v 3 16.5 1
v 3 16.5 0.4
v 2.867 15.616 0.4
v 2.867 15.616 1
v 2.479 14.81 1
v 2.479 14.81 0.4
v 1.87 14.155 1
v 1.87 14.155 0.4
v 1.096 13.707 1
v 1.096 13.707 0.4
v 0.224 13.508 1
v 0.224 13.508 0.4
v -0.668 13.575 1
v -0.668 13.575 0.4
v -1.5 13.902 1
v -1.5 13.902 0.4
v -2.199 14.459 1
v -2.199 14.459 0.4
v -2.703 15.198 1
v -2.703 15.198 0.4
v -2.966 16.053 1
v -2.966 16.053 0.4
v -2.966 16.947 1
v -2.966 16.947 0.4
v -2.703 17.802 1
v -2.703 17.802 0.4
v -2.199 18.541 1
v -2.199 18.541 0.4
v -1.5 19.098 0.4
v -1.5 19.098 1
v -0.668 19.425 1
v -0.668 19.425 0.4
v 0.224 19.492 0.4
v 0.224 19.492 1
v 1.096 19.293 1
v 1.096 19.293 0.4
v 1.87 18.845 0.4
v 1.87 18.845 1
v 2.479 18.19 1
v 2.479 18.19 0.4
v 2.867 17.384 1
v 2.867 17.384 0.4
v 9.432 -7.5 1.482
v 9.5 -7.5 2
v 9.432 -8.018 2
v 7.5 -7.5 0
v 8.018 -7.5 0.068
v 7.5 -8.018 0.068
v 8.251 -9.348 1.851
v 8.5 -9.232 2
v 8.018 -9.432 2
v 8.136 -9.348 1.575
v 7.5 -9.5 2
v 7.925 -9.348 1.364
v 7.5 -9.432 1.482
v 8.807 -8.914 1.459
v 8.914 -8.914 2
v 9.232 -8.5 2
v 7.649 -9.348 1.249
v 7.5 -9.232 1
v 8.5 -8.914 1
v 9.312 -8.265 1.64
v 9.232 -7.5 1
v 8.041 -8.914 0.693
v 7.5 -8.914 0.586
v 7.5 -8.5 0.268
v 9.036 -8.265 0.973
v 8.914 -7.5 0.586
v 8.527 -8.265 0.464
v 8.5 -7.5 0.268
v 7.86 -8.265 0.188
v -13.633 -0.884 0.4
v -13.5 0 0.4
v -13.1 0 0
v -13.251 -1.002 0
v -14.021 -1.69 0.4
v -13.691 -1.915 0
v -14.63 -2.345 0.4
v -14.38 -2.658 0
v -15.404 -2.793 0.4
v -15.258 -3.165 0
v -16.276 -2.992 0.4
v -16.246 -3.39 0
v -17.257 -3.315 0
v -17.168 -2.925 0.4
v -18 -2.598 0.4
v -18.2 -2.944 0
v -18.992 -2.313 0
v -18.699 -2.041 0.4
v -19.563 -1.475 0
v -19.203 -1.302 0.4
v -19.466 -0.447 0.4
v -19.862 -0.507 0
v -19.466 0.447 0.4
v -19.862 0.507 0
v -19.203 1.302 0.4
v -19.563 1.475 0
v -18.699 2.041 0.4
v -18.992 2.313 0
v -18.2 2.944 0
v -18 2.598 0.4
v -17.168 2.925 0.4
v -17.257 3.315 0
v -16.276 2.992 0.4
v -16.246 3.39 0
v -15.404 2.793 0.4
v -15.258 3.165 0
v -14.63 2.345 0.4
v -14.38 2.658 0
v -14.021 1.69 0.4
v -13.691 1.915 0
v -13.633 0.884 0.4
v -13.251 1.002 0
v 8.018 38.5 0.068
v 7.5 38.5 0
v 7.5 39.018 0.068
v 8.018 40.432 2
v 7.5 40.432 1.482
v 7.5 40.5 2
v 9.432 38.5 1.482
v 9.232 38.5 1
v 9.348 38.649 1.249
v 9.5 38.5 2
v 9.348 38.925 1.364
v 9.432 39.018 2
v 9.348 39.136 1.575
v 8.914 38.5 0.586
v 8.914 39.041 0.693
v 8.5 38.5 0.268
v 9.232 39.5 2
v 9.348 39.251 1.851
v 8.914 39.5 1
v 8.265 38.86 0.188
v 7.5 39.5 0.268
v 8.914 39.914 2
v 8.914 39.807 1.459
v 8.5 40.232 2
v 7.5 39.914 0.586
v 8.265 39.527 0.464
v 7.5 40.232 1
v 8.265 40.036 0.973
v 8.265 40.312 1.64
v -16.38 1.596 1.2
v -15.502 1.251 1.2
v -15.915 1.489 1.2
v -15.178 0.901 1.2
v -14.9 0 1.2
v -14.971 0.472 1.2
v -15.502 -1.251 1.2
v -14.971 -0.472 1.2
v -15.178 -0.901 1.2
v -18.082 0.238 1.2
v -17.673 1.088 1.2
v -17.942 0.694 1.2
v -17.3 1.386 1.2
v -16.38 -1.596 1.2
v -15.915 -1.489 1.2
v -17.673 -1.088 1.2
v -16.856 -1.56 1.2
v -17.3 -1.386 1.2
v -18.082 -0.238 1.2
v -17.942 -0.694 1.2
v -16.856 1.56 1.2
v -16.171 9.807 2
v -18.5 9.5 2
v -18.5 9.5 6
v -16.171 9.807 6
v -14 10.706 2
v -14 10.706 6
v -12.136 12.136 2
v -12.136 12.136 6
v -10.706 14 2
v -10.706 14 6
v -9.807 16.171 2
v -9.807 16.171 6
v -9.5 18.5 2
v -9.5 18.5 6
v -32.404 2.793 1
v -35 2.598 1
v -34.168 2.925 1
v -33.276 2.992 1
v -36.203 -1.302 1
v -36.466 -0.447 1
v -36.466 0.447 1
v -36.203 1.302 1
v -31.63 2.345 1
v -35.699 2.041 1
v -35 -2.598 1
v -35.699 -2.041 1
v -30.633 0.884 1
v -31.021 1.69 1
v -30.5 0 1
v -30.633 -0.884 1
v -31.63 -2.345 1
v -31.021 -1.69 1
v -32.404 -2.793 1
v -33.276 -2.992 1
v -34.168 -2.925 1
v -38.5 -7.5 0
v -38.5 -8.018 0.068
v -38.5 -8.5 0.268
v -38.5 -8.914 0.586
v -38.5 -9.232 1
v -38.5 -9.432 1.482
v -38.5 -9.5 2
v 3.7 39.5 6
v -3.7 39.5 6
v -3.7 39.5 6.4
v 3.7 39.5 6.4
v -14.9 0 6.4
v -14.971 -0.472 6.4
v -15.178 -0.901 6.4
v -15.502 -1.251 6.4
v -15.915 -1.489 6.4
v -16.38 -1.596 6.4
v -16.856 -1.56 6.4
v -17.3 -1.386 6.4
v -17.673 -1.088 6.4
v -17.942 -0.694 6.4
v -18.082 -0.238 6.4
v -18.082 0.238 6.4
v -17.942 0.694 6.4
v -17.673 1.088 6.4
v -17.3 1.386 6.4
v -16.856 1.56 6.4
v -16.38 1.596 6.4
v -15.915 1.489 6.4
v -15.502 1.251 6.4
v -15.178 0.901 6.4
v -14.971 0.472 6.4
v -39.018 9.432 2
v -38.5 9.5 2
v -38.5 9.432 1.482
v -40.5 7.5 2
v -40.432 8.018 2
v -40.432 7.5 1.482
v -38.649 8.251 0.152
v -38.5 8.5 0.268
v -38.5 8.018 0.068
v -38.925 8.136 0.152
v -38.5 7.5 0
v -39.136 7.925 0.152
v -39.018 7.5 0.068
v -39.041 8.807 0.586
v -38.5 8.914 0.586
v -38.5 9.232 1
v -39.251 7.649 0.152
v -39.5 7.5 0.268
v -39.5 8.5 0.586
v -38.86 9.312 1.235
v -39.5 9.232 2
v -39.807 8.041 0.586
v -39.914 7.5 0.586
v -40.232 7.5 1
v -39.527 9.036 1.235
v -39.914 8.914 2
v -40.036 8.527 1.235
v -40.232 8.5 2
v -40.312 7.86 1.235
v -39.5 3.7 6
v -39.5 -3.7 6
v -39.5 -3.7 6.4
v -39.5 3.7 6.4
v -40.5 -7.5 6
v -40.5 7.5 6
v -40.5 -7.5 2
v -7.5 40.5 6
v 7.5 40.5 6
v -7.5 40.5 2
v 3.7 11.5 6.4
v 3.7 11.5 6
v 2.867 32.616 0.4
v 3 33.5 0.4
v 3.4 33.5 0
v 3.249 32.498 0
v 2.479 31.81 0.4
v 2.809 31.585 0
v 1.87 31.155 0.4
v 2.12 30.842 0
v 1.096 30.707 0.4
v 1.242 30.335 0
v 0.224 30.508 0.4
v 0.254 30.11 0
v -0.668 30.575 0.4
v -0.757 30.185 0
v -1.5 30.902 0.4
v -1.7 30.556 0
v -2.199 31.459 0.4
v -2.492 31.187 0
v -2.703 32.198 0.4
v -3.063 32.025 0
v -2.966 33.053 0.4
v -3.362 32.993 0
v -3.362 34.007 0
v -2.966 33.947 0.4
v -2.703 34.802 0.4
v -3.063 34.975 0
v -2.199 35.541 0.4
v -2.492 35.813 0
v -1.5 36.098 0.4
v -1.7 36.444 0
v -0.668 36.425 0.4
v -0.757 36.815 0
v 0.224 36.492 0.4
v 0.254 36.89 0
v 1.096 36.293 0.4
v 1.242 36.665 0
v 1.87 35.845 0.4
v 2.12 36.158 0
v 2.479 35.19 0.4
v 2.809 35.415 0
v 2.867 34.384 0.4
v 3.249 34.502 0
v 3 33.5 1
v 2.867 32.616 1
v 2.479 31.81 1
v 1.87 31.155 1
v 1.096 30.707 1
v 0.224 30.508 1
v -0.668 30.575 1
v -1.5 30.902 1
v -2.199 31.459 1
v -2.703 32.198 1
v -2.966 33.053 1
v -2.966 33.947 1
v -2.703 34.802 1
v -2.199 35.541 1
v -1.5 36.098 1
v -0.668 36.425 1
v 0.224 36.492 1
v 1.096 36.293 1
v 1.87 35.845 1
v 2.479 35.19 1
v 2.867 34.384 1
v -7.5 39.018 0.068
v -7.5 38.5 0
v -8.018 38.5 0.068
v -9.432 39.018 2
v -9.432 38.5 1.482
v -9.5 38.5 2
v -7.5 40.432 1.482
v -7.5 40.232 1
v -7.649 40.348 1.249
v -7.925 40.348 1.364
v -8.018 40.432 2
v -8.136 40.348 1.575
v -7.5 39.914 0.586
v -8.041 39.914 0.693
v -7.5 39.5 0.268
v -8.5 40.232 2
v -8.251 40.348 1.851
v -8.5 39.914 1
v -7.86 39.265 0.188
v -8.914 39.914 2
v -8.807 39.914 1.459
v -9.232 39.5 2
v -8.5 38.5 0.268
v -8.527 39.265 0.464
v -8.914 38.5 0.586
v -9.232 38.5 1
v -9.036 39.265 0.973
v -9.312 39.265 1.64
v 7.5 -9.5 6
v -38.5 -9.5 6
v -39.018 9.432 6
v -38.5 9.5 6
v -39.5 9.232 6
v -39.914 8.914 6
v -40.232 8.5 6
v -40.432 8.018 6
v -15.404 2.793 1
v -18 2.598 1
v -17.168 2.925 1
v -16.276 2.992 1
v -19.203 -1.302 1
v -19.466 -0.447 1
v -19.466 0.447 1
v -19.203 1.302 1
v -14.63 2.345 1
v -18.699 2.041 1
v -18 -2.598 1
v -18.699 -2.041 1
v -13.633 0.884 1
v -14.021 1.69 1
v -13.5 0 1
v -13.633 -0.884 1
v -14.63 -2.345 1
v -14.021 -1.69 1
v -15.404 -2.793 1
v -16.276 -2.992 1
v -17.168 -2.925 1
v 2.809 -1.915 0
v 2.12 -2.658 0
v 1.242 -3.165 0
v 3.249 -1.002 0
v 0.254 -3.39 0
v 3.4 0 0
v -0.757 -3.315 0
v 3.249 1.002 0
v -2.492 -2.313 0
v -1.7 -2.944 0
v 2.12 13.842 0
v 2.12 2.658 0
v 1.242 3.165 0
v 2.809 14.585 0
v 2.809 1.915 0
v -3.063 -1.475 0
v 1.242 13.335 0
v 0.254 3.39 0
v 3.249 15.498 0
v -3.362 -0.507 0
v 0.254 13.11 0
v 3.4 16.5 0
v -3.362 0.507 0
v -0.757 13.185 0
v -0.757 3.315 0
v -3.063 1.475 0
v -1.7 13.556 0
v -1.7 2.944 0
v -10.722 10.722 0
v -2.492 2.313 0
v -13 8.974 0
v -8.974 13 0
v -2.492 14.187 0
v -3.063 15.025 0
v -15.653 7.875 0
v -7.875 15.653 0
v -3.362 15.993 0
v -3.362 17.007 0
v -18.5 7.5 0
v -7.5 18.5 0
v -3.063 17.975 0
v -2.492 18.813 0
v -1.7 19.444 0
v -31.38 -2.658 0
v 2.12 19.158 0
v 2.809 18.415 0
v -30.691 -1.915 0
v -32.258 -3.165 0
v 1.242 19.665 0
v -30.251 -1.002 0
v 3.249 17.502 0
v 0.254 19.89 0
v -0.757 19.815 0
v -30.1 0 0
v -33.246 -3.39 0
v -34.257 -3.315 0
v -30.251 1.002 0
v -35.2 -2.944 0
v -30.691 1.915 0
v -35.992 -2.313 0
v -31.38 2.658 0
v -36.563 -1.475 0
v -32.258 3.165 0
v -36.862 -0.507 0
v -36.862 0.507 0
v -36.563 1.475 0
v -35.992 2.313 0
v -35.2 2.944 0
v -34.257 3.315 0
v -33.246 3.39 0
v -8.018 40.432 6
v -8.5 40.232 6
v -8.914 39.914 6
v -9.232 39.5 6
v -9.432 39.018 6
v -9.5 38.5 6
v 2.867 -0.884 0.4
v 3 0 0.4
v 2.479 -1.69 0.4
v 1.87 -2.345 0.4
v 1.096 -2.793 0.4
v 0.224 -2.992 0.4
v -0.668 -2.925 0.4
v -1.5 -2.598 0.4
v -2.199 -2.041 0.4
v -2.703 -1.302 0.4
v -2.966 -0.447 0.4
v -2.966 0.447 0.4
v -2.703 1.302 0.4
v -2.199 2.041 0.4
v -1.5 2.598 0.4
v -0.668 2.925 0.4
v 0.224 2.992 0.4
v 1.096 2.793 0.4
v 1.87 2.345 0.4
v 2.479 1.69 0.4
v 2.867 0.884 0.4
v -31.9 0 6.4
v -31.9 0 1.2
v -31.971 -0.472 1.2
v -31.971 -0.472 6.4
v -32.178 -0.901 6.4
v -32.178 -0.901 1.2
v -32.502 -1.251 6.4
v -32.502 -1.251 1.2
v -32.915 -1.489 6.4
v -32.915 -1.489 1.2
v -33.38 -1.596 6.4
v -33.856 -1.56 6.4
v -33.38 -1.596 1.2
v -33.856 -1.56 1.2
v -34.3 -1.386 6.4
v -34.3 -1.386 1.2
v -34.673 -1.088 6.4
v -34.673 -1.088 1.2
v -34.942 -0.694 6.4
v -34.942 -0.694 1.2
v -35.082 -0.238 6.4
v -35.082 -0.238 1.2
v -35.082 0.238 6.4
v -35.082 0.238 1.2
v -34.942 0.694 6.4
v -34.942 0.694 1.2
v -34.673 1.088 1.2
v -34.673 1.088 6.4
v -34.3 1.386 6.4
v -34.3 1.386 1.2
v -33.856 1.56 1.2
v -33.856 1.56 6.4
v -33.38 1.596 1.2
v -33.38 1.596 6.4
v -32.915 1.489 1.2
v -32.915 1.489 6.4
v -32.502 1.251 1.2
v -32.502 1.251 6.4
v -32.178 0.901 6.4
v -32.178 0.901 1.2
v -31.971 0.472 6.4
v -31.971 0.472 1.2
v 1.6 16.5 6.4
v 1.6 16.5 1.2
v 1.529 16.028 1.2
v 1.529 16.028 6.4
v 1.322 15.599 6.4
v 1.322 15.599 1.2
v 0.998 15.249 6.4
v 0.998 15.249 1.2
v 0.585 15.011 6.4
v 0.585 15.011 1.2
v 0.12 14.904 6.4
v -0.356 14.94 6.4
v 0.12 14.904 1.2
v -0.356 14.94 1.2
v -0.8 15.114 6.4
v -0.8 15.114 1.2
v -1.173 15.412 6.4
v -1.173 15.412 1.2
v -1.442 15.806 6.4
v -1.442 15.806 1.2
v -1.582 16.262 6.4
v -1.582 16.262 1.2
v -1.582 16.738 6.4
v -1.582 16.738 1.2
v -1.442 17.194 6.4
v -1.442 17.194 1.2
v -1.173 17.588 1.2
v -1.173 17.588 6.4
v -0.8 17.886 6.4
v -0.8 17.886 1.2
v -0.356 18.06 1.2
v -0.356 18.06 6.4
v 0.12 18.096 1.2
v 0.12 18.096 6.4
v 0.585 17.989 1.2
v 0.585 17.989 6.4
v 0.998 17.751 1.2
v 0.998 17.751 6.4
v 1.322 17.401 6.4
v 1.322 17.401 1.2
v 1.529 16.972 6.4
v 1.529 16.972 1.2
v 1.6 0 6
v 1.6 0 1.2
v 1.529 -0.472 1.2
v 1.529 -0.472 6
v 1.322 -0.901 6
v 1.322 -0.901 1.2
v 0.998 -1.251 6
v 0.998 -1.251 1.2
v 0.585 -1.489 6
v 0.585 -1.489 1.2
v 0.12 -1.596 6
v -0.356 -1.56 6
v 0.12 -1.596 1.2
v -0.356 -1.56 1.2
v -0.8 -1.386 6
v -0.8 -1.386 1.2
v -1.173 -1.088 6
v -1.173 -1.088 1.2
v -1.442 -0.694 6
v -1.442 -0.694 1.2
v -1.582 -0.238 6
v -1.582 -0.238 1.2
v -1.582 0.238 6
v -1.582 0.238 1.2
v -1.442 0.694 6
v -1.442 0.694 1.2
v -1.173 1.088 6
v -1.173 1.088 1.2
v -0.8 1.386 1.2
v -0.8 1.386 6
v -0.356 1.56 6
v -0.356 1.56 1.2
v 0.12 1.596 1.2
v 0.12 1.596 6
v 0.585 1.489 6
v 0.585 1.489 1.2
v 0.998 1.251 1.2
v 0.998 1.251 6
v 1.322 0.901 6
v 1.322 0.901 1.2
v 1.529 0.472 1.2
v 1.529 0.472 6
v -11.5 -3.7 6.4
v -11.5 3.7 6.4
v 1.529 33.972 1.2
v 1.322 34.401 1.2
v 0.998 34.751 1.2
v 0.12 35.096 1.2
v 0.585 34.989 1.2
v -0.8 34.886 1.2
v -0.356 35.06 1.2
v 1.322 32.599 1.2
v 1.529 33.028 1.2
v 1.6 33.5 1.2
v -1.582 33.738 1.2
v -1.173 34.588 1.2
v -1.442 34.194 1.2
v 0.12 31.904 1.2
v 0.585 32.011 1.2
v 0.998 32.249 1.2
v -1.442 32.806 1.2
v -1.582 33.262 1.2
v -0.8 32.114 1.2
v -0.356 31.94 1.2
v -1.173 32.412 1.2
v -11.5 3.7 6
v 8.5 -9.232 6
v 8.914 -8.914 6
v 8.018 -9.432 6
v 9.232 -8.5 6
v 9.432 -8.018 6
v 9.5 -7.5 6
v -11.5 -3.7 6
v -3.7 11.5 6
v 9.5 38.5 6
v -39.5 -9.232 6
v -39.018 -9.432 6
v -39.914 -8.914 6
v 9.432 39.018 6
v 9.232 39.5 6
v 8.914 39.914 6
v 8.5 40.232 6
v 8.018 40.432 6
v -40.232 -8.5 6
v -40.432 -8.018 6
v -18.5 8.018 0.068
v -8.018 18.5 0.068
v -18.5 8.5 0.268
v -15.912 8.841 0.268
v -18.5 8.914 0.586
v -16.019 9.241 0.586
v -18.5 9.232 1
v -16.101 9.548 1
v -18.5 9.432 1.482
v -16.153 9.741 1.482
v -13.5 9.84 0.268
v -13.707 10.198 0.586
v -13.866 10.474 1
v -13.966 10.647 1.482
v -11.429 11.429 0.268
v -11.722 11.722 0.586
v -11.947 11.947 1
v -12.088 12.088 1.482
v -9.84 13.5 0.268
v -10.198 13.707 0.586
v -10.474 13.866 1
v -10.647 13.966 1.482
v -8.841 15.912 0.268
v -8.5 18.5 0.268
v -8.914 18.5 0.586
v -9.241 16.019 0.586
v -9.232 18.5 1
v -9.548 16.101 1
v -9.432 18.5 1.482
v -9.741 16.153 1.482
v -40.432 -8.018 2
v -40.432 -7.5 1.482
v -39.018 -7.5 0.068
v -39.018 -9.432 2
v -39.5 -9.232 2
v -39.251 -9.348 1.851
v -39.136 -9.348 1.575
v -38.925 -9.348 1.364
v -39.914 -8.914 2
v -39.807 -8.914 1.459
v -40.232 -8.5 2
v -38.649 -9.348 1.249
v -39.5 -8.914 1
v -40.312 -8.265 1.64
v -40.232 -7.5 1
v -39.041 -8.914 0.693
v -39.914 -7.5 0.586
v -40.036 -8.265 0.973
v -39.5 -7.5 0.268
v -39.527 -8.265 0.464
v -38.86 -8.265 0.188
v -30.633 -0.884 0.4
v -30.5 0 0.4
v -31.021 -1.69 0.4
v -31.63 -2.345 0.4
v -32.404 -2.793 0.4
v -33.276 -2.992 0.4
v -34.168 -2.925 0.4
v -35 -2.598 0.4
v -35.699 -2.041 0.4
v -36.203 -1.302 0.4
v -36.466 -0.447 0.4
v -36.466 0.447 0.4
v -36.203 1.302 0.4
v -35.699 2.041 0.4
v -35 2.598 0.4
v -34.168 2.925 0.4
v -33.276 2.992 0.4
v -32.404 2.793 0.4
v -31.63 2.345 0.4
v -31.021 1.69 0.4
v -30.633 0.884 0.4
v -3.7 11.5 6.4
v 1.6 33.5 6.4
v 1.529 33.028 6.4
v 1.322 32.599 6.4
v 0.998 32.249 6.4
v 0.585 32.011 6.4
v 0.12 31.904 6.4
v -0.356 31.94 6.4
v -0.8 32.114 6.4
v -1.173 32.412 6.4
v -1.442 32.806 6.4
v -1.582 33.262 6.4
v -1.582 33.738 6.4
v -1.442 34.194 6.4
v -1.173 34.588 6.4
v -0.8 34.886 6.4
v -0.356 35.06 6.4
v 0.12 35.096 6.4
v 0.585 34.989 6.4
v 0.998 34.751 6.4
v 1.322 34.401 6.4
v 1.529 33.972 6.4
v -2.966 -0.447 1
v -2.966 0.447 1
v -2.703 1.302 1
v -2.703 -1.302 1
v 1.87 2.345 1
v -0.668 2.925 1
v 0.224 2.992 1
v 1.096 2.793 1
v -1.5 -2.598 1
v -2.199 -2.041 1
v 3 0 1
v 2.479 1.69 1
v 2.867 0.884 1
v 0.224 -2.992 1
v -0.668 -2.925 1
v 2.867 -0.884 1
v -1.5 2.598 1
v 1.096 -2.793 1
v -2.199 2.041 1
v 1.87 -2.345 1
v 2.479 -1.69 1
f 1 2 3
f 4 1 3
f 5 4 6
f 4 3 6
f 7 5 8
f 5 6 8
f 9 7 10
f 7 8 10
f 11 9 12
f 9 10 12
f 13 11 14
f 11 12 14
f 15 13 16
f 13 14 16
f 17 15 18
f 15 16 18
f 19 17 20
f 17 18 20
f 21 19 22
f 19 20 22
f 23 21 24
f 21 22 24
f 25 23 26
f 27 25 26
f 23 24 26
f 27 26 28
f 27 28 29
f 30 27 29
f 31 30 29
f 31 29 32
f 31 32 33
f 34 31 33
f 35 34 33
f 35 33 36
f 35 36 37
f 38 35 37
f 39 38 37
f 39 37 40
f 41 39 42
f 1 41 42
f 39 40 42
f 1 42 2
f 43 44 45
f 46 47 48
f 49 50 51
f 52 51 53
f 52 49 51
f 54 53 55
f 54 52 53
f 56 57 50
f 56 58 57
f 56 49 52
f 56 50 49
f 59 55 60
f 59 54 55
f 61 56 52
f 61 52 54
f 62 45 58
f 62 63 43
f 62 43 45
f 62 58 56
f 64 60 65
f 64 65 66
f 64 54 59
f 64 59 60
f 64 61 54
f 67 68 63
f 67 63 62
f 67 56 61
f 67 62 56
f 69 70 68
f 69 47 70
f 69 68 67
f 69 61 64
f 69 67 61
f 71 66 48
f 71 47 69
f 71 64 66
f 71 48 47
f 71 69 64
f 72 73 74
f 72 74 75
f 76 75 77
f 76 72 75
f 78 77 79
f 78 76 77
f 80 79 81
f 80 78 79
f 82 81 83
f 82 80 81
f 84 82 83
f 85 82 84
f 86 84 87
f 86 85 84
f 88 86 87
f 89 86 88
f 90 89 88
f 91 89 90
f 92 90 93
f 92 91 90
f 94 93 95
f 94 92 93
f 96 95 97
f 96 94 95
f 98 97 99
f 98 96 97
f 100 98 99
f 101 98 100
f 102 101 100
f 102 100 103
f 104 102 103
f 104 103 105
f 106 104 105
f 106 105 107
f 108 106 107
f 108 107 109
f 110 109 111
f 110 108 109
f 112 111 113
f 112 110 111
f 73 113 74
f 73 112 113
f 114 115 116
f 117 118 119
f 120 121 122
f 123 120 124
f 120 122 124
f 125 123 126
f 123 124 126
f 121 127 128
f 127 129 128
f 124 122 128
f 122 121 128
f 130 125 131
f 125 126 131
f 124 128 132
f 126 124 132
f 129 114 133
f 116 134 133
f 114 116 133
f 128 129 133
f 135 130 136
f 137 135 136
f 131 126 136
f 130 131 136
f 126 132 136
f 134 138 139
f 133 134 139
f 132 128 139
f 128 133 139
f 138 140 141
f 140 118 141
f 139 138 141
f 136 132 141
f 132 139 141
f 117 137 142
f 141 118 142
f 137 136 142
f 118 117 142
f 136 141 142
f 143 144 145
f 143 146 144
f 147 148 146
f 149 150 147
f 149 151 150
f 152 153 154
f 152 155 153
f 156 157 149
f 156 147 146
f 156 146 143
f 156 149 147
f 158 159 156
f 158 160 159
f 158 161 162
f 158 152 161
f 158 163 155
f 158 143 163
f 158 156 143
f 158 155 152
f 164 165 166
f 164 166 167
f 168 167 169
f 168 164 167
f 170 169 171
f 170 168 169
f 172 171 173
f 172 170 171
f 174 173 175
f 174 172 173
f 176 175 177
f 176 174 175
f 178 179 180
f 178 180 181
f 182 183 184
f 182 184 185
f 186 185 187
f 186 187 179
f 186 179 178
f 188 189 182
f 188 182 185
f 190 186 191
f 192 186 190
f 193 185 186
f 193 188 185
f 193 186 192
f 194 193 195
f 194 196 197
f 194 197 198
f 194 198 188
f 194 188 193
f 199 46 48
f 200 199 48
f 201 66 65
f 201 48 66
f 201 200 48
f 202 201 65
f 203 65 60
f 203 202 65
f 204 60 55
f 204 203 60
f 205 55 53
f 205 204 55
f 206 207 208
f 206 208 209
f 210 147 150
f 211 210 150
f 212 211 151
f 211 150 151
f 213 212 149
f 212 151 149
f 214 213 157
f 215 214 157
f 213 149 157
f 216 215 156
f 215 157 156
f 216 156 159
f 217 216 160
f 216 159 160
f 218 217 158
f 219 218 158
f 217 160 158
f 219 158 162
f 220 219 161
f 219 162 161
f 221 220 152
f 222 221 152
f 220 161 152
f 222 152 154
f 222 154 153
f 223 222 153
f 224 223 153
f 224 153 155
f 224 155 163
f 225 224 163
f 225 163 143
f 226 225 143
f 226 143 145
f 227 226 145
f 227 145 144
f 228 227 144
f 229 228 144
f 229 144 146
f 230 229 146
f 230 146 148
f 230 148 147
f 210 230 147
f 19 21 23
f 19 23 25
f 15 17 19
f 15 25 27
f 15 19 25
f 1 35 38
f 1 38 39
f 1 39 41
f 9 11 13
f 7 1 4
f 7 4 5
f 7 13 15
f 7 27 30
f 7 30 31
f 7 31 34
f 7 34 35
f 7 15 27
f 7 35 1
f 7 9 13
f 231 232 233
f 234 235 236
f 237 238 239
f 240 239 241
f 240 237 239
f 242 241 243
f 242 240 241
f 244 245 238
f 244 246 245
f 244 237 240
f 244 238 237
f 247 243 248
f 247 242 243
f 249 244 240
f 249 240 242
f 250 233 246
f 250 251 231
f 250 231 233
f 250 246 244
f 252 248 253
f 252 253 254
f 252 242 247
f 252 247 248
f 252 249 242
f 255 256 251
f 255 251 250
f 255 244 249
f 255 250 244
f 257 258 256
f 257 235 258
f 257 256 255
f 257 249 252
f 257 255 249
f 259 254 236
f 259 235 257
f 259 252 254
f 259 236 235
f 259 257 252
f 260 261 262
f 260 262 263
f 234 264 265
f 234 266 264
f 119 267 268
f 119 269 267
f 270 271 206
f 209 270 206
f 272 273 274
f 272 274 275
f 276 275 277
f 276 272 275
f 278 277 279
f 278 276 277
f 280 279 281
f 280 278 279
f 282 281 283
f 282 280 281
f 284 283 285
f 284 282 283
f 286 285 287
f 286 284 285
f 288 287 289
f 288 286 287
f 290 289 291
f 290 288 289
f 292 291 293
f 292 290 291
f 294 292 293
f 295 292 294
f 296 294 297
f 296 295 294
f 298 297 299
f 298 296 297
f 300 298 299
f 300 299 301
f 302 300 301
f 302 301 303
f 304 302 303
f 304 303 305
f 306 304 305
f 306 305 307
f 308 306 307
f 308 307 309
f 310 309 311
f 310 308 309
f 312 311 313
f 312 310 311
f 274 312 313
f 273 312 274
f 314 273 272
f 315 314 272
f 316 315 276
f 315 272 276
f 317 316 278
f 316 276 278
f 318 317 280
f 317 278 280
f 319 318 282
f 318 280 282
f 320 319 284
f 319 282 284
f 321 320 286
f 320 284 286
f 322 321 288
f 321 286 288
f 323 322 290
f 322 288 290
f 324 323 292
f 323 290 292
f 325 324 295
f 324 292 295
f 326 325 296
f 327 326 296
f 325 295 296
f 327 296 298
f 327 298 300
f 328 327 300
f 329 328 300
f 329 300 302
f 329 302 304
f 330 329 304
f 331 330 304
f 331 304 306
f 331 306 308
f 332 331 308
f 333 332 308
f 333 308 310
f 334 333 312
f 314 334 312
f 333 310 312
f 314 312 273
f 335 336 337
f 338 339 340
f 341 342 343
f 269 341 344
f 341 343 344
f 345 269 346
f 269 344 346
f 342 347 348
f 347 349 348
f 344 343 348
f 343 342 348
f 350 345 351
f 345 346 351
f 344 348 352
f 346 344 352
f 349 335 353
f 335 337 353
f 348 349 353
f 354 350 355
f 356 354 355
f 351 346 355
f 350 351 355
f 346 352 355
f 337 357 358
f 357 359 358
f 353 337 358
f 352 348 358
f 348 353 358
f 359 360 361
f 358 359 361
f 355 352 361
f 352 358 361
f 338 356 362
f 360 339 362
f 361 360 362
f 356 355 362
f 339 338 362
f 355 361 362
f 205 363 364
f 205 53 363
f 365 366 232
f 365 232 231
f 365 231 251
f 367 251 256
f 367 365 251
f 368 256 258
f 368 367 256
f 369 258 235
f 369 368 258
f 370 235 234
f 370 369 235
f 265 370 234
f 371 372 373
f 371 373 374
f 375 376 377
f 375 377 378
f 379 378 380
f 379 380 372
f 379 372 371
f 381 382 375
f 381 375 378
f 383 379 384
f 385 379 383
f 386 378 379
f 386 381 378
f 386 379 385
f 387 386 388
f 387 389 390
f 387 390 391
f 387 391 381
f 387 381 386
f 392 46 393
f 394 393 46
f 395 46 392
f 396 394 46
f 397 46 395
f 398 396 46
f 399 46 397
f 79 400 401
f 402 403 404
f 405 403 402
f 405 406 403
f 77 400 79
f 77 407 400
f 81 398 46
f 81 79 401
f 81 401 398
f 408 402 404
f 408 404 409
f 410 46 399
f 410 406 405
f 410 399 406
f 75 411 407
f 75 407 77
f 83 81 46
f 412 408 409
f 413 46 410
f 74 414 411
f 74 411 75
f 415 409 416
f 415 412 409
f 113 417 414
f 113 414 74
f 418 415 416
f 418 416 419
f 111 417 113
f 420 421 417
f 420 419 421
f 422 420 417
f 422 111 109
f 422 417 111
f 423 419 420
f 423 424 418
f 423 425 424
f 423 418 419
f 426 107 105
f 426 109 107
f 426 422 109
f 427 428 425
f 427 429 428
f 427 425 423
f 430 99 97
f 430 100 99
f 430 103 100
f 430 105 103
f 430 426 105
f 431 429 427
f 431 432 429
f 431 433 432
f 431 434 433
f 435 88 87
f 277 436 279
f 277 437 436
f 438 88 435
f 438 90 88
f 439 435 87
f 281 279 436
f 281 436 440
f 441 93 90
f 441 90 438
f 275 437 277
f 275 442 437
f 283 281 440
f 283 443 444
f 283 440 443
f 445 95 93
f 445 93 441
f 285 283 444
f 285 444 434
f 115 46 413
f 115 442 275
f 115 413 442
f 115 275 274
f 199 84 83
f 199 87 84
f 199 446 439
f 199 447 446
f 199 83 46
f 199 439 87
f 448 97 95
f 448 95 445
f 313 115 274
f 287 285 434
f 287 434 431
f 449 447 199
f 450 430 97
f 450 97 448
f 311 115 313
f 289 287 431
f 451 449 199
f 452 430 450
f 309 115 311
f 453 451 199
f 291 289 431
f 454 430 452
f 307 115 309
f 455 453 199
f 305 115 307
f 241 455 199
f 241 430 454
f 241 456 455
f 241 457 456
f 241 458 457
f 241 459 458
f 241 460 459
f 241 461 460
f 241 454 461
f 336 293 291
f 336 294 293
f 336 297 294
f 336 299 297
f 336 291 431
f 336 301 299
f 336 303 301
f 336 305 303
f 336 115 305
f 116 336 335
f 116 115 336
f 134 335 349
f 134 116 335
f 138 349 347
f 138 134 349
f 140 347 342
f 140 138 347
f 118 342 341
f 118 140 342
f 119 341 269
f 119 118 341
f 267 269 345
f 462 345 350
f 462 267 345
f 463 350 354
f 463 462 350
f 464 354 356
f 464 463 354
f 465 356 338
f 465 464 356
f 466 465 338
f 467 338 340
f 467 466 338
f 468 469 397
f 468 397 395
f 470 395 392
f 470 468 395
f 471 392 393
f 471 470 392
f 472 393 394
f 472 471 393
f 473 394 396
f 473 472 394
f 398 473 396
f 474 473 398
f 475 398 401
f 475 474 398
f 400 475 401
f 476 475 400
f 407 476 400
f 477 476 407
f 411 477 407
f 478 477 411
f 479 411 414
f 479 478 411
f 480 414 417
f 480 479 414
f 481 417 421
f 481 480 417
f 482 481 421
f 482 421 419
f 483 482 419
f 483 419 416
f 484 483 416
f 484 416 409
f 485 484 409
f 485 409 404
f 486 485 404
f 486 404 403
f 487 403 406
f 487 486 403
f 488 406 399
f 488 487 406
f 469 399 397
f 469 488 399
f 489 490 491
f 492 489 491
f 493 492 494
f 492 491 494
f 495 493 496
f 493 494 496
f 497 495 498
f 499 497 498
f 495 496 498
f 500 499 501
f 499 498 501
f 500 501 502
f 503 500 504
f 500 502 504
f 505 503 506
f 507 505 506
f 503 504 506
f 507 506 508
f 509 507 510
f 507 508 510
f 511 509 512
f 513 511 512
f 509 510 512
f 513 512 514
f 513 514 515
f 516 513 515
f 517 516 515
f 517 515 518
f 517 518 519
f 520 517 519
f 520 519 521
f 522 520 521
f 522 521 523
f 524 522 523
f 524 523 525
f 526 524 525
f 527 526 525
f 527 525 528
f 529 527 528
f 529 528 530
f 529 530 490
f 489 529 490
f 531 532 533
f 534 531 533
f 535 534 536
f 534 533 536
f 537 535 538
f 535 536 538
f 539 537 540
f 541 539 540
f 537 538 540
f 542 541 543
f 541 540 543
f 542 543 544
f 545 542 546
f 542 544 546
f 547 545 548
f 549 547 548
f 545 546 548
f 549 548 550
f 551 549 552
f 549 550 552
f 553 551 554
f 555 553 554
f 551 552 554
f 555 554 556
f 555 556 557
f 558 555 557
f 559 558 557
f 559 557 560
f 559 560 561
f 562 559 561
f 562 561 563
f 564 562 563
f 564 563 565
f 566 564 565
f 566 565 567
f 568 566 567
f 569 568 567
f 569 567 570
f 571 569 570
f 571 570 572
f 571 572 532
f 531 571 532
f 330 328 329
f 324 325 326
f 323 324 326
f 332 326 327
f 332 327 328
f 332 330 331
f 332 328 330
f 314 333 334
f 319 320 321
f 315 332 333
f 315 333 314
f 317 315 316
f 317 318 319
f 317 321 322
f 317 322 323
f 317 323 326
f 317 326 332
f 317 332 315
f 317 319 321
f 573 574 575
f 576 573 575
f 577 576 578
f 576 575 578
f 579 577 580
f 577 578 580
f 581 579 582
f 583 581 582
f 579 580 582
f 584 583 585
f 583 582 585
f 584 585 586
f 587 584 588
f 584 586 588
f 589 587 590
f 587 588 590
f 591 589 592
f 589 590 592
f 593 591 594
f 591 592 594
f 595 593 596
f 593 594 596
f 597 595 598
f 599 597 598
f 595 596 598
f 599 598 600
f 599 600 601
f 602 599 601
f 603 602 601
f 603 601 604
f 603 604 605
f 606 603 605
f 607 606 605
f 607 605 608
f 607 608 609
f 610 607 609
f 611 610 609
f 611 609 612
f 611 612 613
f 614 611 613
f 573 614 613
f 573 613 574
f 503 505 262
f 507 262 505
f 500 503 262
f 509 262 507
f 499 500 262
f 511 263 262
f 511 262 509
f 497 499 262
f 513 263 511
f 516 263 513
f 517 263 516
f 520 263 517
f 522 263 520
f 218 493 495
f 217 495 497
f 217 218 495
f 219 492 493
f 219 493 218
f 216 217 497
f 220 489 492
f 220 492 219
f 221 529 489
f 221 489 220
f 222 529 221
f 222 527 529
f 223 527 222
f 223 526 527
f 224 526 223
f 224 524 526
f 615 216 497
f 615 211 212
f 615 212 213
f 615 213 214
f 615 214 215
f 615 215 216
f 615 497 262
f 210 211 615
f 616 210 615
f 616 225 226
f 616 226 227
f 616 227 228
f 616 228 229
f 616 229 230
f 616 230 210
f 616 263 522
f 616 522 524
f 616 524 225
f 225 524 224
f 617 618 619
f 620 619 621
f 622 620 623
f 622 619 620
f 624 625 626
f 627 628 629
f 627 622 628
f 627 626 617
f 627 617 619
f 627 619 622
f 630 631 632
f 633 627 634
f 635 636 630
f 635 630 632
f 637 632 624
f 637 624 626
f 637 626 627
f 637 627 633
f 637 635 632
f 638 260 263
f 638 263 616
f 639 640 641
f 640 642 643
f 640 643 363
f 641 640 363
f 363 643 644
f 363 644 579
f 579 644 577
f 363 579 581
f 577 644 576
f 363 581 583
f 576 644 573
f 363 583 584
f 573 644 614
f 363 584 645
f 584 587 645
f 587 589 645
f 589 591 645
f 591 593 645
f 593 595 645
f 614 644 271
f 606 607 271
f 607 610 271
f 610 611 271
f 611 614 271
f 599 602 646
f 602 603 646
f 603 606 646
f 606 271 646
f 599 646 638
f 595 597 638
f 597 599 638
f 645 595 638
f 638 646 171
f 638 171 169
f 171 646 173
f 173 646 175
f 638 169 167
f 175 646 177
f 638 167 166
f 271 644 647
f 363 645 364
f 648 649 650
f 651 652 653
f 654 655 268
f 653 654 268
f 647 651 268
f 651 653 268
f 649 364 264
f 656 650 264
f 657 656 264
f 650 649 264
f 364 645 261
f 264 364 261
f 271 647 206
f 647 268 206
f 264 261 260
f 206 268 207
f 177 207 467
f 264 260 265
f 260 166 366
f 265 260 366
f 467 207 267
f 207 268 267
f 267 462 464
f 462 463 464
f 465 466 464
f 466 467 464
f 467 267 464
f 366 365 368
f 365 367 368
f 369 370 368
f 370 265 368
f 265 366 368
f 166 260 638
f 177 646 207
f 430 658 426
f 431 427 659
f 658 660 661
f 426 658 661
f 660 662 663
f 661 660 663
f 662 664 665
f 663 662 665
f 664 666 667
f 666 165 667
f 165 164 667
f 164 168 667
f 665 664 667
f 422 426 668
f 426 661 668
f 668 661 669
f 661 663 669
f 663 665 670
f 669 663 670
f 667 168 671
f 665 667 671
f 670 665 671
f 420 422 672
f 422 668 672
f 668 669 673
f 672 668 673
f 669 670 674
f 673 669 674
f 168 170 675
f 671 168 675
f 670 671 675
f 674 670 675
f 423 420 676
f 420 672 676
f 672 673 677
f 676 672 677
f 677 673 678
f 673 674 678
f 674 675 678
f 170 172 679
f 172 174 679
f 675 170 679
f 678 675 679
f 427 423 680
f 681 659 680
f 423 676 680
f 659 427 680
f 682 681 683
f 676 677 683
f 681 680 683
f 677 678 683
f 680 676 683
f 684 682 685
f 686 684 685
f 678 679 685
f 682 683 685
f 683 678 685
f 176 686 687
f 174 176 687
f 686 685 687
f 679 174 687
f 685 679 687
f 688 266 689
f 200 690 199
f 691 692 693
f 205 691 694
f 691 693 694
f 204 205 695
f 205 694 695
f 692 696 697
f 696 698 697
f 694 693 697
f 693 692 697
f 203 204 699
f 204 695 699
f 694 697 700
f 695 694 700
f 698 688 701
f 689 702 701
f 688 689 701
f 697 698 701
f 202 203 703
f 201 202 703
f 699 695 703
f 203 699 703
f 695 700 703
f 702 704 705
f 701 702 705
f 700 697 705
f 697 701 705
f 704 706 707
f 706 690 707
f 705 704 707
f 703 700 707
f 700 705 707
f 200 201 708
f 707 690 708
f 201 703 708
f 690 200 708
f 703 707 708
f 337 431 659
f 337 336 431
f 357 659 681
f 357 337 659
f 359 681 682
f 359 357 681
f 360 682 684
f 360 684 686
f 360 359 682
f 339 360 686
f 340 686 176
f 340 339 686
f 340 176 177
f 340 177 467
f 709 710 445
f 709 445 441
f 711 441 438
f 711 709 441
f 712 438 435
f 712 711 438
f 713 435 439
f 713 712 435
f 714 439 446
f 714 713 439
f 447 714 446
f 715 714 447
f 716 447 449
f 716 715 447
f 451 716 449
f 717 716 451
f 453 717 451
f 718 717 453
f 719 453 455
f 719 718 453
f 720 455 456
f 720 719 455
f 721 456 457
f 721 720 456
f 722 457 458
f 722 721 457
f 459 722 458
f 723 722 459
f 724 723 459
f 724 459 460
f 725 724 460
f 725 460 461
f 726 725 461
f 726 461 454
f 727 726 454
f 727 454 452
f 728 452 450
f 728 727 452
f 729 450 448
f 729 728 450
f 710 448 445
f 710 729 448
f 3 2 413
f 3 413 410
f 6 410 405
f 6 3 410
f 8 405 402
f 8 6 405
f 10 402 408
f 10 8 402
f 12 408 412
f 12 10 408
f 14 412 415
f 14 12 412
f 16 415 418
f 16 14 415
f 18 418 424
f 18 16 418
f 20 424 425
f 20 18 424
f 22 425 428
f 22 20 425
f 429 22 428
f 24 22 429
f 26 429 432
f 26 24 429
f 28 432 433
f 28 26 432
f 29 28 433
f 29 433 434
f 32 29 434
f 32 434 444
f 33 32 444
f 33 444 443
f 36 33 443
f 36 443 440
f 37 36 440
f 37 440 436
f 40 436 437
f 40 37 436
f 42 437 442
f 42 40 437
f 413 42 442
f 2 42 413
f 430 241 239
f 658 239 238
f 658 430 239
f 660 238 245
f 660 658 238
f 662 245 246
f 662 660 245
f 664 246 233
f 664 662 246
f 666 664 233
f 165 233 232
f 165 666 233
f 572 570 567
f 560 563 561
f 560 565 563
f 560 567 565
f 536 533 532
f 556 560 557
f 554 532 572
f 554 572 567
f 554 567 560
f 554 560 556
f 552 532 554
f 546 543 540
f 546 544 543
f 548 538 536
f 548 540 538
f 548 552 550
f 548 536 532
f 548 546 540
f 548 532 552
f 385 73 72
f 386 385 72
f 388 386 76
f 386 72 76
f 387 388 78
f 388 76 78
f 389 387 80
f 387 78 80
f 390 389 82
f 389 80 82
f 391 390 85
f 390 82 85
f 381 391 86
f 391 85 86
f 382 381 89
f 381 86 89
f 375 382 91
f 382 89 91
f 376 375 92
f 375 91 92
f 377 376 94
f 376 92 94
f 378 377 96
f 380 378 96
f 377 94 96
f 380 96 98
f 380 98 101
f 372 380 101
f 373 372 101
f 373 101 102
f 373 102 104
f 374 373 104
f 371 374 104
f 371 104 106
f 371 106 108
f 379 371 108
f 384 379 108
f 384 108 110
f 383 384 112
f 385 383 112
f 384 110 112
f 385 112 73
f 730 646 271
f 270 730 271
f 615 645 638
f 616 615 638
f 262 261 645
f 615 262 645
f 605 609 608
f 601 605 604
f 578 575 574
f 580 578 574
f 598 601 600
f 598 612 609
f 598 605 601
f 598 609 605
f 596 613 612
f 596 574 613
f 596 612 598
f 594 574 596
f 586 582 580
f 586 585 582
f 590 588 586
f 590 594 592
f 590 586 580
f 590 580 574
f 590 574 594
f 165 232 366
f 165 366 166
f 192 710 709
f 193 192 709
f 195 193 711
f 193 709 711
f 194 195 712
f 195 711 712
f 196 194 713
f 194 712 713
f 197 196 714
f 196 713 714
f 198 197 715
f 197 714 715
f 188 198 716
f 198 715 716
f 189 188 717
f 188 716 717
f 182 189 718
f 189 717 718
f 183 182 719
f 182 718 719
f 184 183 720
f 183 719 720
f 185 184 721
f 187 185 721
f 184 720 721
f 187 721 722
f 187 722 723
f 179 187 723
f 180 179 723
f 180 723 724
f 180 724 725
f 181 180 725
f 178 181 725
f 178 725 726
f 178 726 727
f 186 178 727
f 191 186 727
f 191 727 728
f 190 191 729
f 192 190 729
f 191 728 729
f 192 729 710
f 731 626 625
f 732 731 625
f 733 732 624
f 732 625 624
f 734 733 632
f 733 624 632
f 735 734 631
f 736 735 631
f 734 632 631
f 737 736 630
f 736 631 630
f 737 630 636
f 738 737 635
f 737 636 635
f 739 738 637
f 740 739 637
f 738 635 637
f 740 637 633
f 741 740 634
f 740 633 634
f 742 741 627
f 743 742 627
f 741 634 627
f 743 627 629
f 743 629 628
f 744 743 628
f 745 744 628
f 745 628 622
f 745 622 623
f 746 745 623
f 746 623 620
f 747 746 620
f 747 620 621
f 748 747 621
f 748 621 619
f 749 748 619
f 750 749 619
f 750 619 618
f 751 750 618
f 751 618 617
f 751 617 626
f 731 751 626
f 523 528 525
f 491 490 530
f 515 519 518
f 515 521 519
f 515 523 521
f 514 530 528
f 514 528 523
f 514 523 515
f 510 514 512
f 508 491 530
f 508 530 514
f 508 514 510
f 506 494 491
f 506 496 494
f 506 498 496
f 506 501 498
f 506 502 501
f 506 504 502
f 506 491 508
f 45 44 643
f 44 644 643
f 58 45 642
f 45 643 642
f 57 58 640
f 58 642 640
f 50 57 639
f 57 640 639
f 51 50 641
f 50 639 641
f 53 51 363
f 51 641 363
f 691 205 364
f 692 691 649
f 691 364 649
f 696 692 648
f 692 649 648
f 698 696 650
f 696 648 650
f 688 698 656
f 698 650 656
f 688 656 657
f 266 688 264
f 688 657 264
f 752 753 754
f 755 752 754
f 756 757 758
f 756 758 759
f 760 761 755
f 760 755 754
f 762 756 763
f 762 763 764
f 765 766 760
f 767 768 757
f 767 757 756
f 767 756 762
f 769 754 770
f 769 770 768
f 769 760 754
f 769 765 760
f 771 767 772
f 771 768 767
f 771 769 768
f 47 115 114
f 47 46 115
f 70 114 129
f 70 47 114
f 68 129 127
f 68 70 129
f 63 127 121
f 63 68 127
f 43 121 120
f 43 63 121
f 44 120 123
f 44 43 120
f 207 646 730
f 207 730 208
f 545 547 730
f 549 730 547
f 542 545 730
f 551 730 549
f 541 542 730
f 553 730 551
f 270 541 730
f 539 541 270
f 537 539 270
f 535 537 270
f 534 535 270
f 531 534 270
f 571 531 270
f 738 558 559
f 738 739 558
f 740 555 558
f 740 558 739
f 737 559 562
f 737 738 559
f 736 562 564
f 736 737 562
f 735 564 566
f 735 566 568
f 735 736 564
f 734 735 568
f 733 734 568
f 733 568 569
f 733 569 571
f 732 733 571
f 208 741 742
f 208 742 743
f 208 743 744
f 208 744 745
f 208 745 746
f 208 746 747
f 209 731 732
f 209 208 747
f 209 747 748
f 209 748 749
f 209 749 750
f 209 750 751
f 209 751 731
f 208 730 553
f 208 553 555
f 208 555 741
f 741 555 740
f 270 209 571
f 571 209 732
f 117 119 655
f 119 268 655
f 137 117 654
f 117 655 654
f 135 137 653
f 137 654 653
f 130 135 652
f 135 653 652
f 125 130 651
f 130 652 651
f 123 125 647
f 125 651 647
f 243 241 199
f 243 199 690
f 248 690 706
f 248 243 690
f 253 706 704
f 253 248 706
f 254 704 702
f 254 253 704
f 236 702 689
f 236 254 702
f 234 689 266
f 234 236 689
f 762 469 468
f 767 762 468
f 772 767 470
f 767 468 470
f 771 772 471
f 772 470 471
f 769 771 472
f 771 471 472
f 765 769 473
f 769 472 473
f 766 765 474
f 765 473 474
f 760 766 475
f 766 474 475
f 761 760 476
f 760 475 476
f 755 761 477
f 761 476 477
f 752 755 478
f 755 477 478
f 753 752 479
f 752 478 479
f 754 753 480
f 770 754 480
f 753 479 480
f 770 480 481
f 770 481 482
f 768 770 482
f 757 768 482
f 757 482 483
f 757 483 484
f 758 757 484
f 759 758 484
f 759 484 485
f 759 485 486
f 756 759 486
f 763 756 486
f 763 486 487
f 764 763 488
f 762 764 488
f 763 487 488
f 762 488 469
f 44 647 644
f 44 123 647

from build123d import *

# Parameters (mm, degrees)
PAD_DEPTH       = 6
SKETCH001_W     = 28
SKETCH001_H     = 7.4
SKETCH001_W_2   = 7.4
SKETCH001_H_2   = 28
PAD001_DEPTH    = 0.4
SKETCH002_R     = 1.6
POCKET_DEPTH    = 6.401
SKETCH003_R     = 3
POCKET001_DEPTH = 1
PAD002_DEPTH    = 0.2
SKETCH007_R     = 1
POCKET002_DEPTH = 0.01
FILLET_R        = 2
CHAMFER_SIZE    = 0.4


with BuildPart() as part:
    # Sketch → Pad (new body)
    with BuildSketch(Plane.XY):
        with BuildLine():
            Line((-9.5, 40.5), (9.5, 40.5))
            Line((9.5, 40.5), (9.5, -9.5))
            Line((9.5, -9.5), (-40.5, -9.5))
            Line((-40.5, -9.5), (-40.5, 9.5))
            Line((-40.5, 9.5), (-18.5, 9.5))
            ThreePointArc((-18.5, 9.5), (-12.136039, 12.136039), (-9.5, 18.5))
            Line((-9.5, 18.5), (-9.5, 40.5))
        make_face()
    extrude(amount=PAD_DEPTH)

    # Sketch001 → Pad001 (new body)
    with BuildSketch(Plane.XY.offset(6)):
        with Locations((-25.5, 0)):
            Rectangle(SKETCH001_W, SKETCH001_H)
        with Locations((0, 25.5)):
            Rectangle(SKETCH001_W_2, SKETCH001_H_2)
    extrude(amount=PAD001_DEPTH)

    # Sketch002 → Pocket (cut, through all)
    with BuildSketch(Plane(origin=(0, 0, 0), x_dir=(1, 0, 0), z_dir=(0, 0, -1))):
        with Locations((-33.5, 0)):
            Circle(SKETCH002_R)
        with Locations((-16.5, 0)):
            Circle(SKETCH002_R)
        with Locations((0, -16.5)):
            Circle(SKETCH002_R)
        with Locations((0, -33.5)):
            Circle(SKETCH002_R)
        Circle(SKETCH002_R)
    extrude(amount=-POCKET_DEPTH, mode=Mode.SUBTRACT)

    # Sketch003 → Pocket001 (cut)
    with BuildSketch(Plane(origin=(0, 0, 0), x_dir=(1, 0, 0), z_dir=(0, 0, -1))):
        with Locations((-33.5, 0)):
            Circle(SKETCH003_R)
        with Locations((-16.5, 0)):
            Circle(SKETCH003_R)
        with Locations((0, -16.5)):
            Circle(SKETCH003_R)
        with Locations((0, -33.5)):
            Circle(SKETCH003_R)
        Circle(SKETCH003_R)
    extrude(amount=-POCKET001_DEPTH, mode=Mode.SUBTRACT)

    # Sketch006 → Pad002 (new body)
    with BuildSketch(Plane(origin=(0, 0, 1), x_dir=(1, 0, 0), z_dir=(0, 0, -1))):
        Polygon((-36.591786, 5.291606), (5.977032, 5.291606), (5.977032, -37.277212), (-5.613096, -37.277212), (-5.613096, -6.298522), (-36.591786, -6.298522), align=None)
    extrude(amount=-PAD002_DEPTH)

    # Sketch007 → Pocket002 (cut)
    with BuildSketch(Plane.XY.offset(6)):
        Circle(SKETCH007_R)
    extrude(amount=POCKET002_DEPTH, mode=Mode.SUBTRACT)

    # Fillet
    fillet_edges = [part.edges().sort_by_distance(p)[0] for p in [
        (-40.5, 9.5, 3),
        (-29.5, 9.5, 0),
        (-12.136039, 12.136039, 0),
        (-9.5, 29.5, 0),
        (0, 40.5, 0),
        (9.5, 15.5, 0),
        (9.5, -9.5, 3),
        (9.5, 40.5, 3),
        (-9.5, 40.5, 3),
        (-40.5, 0, 0),
        (-40.5, -9.5, 3),
        (-15.5, -9.5, 0),
    ]]
    fillet(fillet_edges, radius=FILLET_R)

    # Chamfer
    chamfer_edges = [part.edges().sort_by_distance(p)[0] for p in [
        (-19.5, 0, 0),
        (-36.5, 0, 0),
        (-3, 0, 0),
        (-3, 16.5, 0),
        (-3, 33.5, 0),
    ]]
    chamfer(chamfer_edges, length=CHAMFER_SIZE)


solid = part.part
